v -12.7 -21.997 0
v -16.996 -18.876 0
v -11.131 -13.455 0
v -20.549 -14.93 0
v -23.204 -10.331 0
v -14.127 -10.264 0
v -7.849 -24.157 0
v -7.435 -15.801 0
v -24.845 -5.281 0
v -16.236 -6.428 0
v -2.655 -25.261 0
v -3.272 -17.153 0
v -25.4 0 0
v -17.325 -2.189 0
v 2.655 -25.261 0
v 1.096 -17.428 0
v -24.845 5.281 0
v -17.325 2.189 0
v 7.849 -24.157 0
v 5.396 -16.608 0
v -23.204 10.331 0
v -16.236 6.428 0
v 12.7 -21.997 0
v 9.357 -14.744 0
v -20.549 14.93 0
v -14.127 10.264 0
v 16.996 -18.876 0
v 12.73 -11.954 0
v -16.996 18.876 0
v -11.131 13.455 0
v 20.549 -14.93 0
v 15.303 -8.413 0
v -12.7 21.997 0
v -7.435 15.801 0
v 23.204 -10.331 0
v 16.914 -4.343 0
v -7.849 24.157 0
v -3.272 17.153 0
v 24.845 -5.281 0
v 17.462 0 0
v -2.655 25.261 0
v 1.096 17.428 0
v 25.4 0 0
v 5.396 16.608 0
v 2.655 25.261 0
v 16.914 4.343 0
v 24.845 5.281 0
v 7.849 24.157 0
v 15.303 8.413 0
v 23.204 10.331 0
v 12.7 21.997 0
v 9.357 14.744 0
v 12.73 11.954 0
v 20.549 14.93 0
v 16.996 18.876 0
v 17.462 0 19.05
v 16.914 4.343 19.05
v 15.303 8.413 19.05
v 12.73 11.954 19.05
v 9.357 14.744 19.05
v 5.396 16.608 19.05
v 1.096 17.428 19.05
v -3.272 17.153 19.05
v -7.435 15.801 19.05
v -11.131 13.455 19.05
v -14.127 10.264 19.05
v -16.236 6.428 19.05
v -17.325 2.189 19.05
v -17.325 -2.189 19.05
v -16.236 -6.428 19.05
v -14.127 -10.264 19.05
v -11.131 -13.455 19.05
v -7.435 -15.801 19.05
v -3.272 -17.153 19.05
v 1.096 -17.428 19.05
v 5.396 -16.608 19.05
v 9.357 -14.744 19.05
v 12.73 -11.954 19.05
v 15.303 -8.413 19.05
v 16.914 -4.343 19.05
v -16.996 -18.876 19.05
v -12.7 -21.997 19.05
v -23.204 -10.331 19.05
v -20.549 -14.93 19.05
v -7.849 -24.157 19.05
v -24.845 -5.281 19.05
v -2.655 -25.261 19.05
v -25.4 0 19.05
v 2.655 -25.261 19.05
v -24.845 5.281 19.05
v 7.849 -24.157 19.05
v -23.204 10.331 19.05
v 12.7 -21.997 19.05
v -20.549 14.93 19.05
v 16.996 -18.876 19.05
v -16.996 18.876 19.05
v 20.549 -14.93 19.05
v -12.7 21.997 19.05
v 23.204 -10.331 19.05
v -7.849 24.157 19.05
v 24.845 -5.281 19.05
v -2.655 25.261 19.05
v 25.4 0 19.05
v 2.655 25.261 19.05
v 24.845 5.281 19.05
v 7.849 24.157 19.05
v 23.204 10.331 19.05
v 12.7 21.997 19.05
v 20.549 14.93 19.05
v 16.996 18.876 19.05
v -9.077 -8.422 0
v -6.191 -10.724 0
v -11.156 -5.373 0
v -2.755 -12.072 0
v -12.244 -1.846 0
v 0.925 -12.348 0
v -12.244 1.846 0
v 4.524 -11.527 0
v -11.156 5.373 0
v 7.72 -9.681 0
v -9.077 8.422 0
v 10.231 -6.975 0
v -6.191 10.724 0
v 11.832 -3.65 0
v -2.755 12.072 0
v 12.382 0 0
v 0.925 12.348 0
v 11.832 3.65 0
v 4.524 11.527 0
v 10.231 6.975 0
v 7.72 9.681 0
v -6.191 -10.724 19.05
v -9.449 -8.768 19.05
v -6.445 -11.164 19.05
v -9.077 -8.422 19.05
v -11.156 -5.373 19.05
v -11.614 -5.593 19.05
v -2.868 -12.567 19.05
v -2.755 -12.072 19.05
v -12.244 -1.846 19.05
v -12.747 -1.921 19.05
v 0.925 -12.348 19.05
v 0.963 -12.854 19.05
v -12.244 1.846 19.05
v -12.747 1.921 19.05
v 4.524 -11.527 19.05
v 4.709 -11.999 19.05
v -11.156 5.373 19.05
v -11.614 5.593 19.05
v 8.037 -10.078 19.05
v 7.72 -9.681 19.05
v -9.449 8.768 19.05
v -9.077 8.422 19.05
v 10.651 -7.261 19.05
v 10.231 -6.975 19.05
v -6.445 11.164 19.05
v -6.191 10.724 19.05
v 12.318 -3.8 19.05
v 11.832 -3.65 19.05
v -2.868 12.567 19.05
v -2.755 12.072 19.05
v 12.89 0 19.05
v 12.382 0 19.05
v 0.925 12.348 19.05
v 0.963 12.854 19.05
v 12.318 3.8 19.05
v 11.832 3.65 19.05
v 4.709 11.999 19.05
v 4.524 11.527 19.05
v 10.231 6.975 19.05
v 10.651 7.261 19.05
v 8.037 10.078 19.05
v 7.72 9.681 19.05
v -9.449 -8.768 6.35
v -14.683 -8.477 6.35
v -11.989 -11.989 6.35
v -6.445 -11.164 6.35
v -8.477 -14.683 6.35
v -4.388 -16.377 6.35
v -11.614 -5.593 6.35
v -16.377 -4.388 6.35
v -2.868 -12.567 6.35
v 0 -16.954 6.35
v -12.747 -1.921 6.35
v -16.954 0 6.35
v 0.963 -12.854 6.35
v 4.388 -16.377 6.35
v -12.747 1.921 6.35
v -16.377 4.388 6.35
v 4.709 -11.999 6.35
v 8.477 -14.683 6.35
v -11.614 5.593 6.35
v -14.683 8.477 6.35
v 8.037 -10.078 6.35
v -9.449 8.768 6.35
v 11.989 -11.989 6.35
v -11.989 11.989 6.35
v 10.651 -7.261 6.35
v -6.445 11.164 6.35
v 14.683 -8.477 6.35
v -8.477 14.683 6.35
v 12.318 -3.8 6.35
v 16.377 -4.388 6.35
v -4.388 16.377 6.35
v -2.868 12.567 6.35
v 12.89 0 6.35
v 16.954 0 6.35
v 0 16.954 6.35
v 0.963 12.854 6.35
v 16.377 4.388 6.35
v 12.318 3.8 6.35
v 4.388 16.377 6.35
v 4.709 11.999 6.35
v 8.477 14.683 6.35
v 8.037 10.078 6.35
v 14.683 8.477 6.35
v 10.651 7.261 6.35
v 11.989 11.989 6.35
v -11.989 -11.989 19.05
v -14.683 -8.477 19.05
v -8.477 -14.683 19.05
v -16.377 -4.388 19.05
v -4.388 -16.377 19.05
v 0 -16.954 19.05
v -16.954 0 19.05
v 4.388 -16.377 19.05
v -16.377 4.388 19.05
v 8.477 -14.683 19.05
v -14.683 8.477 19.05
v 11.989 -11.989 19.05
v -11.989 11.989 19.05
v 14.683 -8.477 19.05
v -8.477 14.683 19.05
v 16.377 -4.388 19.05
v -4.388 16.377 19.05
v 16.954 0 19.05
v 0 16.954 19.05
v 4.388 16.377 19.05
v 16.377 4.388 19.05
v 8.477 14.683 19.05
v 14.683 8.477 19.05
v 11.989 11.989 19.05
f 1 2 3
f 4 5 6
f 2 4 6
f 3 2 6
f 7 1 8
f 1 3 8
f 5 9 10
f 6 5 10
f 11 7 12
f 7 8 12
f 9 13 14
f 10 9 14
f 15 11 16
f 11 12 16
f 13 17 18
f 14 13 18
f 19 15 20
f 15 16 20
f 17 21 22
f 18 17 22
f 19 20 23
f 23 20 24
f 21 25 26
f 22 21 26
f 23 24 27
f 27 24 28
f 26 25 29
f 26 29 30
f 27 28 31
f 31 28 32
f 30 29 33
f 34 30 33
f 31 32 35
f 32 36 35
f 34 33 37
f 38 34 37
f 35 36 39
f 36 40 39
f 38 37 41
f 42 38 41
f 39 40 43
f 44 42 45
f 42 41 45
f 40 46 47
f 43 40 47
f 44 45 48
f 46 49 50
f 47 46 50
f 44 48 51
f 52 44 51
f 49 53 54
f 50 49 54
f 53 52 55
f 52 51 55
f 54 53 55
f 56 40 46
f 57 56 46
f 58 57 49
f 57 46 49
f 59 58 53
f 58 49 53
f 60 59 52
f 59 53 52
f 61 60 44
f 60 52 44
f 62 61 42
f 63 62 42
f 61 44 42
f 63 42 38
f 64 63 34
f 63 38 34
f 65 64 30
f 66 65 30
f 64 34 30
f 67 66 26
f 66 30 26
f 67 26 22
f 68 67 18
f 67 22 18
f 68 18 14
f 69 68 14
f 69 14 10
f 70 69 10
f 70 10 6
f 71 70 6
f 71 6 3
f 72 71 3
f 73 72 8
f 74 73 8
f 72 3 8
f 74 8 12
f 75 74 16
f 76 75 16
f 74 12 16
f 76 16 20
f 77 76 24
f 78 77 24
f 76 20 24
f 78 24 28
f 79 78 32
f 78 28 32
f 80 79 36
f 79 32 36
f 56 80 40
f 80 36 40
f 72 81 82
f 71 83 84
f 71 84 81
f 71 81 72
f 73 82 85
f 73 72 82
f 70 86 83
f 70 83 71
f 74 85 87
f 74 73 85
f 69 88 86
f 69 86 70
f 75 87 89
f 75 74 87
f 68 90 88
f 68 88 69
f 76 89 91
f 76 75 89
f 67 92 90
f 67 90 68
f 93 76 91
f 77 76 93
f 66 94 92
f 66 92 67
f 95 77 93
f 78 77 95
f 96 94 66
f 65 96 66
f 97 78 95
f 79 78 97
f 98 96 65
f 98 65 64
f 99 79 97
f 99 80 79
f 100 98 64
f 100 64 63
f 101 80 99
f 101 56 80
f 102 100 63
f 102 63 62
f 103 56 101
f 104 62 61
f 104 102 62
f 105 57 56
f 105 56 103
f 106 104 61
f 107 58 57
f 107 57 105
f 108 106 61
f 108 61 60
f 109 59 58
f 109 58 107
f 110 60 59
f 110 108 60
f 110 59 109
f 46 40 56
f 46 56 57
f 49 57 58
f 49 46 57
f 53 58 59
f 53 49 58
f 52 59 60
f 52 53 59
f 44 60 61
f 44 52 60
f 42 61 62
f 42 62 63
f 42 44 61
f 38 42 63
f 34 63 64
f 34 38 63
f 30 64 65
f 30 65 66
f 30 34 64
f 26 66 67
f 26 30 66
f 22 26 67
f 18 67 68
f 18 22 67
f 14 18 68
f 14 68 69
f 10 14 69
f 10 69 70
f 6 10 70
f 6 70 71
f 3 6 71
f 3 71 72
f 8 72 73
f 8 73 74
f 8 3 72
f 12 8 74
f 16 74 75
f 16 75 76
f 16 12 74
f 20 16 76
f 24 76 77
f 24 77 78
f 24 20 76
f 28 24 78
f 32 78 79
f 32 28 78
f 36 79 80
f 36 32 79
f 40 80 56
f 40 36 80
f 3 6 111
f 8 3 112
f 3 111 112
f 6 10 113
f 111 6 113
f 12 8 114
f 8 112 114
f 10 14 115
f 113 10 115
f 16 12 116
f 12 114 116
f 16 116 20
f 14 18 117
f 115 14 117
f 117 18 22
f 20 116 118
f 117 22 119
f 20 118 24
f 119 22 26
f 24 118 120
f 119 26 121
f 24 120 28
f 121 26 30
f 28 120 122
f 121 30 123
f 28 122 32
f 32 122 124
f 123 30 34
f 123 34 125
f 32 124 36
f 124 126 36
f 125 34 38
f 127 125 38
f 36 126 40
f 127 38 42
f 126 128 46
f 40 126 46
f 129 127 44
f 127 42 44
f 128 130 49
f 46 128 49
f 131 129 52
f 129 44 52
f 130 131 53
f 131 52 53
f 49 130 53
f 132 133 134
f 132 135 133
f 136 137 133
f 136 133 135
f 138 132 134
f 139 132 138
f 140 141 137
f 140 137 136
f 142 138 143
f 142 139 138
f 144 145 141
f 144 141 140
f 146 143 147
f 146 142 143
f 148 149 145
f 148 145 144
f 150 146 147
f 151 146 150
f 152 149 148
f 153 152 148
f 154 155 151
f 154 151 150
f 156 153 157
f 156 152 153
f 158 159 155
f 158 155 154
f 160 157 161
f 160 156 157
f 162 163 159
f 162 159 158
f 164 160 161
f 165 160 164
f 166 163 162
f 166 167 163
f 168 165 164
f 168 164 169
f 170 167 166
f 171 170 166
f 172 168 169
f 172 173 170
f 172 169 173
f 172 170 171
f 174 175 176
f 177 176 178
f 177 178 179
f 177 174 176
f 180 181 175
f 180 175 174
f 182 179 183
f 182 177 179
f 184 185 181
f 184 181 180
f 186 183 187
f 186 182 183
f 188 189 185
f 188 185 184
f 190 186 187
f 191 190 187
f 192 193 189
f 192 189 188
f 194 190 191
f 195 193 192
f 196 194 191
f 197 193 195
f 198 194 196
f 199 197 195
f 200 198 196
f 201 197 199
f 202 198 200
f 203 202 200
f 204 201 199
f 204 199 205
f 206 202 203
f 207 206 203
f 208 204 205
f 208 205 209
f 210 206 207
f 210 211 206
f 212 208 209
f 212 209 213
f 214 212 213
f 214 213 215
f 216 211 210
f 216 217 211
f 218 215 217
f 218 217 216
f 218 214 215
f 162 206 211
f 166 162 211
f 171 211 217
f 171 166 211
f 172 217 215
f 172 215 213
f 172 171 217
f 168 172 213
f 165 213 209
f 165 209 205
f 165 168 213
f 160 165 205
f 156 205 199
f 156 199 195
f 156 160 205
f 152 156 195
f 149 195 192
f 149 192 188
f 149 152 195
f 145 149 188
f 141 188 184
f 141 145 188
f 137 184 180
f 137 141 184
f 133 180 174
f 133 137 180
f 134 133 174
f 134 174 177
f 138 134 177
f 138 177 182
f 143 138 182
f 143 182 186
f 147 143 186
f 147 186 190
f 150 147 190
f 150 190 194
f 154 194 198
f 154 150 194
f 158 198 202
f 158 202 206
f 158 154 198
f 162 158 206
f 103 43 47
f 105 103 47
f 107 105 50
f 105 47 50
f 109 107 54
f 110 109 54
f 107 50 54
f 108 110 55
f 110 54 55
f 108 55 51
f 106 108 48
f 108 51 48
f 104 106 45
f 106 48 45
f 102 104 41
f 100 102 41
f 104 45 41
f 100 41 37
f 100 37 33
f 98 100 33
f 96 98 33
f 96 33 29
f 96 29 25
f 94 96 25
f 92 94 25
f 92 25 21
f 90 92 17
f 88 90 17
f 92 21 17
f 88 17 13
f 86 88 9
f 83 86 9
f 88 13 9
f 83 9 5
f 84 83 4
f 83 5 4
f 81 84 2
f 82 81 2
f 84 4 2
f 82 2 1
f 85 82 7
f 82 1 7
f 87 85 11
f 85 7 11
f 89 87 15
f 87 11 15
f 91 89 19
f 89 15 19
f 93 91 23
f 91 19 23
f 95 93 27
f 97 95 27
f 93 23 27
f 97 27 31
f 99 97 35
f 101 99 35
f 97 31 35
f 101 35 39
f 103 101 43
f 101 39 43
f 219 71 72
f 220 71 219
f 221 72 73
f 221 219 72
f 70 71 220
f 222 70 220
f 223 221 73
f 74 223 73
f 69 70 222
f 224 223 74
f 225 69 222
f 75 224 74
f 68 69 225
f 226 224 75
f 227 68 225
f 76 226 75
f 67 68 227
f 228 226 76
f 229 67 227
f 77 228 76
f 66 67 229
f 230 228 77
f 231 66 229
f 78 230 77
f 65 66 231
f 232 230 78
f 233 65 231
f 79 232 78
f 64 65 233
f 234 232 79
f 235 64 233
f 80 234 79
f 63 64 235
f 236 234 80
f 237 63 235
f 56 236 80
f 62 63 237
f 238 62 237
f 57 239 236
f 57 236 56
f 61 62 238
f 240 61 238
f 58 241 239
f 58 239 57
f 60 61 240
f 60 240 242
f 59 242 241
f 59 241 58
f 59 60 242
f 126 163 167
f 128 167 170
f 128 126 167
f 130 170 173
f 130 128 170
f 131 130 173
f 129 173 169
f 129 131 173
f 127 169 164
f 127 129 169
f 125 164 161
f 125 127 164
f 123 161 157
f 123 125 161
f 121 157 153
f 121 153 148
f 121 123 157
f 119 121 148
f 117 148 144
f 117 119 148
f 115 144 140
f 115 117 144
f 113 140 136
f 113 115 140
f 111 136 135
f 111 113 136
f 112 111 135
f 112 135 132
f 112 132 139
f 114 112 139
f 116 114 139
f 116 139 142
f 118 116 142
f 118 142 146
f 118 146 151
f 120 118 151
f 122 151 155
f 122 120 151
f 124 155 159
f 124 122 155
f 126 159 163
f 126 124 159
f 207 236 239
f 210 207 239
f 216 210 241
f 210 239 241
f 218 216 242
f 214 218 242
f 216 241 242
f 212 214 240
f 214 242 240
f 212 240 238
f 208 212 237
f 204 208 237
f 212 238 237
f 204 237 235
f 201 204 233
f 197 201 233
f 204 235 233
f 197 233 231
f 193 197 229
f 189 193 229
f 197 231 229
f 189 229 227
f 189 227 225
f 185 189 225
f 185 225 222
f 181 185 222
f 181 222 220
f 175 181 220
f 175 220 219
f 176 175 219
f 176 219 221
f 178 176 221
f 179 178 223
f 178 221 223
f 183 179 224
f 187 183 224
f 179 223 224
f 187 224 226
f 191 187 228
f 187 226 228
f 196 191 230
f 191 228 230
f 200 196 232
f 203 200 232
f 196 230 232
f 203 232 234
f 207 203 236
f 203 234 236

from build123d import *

# Parameters (mm, degrees)
F0_R     = 25.4
F0_R_2   = 17.4625
F1_DEPTH = 19.05
F2_R     = 17.4625
F2_R_2   = 12.3825
F3_DEPTH = 19.05
F4_R     = 16.9545
F4_R_2   = 12.8905
F5_DEPTH = 12.7


with BuildPart() as f1:
    # F0 (on Top) → F1 (new body)
    with BuildSketch(Plane.XY):
        Circle(F0_R)
        Circle(F0_R_2, mode=Mode.SUBTRACT)
    extrude(amount=F1_DEPTH)


with BuildPart() as f3:
    # F2 (on Top) → F3 (new body)
    with BuildSketch(Plane.XY):
        Circle(F2_R)
        Circle(F2_R_2, mode=Mode.SUBTRACT)
    extrude(amount=F3_DEPTH)

    # F4 (on face) → F5 (cut)
    with BuildSketch(Plane.XY.offset(19.05)):
        Circle(F4_R)
        Circle(F4_R_2, mode=Mode.SUBTRACT)
    extrude(amount=-F5_DEPTH, mode=Mode.SUBTRACT)


solid = Compound([f1.part, f3.part])
